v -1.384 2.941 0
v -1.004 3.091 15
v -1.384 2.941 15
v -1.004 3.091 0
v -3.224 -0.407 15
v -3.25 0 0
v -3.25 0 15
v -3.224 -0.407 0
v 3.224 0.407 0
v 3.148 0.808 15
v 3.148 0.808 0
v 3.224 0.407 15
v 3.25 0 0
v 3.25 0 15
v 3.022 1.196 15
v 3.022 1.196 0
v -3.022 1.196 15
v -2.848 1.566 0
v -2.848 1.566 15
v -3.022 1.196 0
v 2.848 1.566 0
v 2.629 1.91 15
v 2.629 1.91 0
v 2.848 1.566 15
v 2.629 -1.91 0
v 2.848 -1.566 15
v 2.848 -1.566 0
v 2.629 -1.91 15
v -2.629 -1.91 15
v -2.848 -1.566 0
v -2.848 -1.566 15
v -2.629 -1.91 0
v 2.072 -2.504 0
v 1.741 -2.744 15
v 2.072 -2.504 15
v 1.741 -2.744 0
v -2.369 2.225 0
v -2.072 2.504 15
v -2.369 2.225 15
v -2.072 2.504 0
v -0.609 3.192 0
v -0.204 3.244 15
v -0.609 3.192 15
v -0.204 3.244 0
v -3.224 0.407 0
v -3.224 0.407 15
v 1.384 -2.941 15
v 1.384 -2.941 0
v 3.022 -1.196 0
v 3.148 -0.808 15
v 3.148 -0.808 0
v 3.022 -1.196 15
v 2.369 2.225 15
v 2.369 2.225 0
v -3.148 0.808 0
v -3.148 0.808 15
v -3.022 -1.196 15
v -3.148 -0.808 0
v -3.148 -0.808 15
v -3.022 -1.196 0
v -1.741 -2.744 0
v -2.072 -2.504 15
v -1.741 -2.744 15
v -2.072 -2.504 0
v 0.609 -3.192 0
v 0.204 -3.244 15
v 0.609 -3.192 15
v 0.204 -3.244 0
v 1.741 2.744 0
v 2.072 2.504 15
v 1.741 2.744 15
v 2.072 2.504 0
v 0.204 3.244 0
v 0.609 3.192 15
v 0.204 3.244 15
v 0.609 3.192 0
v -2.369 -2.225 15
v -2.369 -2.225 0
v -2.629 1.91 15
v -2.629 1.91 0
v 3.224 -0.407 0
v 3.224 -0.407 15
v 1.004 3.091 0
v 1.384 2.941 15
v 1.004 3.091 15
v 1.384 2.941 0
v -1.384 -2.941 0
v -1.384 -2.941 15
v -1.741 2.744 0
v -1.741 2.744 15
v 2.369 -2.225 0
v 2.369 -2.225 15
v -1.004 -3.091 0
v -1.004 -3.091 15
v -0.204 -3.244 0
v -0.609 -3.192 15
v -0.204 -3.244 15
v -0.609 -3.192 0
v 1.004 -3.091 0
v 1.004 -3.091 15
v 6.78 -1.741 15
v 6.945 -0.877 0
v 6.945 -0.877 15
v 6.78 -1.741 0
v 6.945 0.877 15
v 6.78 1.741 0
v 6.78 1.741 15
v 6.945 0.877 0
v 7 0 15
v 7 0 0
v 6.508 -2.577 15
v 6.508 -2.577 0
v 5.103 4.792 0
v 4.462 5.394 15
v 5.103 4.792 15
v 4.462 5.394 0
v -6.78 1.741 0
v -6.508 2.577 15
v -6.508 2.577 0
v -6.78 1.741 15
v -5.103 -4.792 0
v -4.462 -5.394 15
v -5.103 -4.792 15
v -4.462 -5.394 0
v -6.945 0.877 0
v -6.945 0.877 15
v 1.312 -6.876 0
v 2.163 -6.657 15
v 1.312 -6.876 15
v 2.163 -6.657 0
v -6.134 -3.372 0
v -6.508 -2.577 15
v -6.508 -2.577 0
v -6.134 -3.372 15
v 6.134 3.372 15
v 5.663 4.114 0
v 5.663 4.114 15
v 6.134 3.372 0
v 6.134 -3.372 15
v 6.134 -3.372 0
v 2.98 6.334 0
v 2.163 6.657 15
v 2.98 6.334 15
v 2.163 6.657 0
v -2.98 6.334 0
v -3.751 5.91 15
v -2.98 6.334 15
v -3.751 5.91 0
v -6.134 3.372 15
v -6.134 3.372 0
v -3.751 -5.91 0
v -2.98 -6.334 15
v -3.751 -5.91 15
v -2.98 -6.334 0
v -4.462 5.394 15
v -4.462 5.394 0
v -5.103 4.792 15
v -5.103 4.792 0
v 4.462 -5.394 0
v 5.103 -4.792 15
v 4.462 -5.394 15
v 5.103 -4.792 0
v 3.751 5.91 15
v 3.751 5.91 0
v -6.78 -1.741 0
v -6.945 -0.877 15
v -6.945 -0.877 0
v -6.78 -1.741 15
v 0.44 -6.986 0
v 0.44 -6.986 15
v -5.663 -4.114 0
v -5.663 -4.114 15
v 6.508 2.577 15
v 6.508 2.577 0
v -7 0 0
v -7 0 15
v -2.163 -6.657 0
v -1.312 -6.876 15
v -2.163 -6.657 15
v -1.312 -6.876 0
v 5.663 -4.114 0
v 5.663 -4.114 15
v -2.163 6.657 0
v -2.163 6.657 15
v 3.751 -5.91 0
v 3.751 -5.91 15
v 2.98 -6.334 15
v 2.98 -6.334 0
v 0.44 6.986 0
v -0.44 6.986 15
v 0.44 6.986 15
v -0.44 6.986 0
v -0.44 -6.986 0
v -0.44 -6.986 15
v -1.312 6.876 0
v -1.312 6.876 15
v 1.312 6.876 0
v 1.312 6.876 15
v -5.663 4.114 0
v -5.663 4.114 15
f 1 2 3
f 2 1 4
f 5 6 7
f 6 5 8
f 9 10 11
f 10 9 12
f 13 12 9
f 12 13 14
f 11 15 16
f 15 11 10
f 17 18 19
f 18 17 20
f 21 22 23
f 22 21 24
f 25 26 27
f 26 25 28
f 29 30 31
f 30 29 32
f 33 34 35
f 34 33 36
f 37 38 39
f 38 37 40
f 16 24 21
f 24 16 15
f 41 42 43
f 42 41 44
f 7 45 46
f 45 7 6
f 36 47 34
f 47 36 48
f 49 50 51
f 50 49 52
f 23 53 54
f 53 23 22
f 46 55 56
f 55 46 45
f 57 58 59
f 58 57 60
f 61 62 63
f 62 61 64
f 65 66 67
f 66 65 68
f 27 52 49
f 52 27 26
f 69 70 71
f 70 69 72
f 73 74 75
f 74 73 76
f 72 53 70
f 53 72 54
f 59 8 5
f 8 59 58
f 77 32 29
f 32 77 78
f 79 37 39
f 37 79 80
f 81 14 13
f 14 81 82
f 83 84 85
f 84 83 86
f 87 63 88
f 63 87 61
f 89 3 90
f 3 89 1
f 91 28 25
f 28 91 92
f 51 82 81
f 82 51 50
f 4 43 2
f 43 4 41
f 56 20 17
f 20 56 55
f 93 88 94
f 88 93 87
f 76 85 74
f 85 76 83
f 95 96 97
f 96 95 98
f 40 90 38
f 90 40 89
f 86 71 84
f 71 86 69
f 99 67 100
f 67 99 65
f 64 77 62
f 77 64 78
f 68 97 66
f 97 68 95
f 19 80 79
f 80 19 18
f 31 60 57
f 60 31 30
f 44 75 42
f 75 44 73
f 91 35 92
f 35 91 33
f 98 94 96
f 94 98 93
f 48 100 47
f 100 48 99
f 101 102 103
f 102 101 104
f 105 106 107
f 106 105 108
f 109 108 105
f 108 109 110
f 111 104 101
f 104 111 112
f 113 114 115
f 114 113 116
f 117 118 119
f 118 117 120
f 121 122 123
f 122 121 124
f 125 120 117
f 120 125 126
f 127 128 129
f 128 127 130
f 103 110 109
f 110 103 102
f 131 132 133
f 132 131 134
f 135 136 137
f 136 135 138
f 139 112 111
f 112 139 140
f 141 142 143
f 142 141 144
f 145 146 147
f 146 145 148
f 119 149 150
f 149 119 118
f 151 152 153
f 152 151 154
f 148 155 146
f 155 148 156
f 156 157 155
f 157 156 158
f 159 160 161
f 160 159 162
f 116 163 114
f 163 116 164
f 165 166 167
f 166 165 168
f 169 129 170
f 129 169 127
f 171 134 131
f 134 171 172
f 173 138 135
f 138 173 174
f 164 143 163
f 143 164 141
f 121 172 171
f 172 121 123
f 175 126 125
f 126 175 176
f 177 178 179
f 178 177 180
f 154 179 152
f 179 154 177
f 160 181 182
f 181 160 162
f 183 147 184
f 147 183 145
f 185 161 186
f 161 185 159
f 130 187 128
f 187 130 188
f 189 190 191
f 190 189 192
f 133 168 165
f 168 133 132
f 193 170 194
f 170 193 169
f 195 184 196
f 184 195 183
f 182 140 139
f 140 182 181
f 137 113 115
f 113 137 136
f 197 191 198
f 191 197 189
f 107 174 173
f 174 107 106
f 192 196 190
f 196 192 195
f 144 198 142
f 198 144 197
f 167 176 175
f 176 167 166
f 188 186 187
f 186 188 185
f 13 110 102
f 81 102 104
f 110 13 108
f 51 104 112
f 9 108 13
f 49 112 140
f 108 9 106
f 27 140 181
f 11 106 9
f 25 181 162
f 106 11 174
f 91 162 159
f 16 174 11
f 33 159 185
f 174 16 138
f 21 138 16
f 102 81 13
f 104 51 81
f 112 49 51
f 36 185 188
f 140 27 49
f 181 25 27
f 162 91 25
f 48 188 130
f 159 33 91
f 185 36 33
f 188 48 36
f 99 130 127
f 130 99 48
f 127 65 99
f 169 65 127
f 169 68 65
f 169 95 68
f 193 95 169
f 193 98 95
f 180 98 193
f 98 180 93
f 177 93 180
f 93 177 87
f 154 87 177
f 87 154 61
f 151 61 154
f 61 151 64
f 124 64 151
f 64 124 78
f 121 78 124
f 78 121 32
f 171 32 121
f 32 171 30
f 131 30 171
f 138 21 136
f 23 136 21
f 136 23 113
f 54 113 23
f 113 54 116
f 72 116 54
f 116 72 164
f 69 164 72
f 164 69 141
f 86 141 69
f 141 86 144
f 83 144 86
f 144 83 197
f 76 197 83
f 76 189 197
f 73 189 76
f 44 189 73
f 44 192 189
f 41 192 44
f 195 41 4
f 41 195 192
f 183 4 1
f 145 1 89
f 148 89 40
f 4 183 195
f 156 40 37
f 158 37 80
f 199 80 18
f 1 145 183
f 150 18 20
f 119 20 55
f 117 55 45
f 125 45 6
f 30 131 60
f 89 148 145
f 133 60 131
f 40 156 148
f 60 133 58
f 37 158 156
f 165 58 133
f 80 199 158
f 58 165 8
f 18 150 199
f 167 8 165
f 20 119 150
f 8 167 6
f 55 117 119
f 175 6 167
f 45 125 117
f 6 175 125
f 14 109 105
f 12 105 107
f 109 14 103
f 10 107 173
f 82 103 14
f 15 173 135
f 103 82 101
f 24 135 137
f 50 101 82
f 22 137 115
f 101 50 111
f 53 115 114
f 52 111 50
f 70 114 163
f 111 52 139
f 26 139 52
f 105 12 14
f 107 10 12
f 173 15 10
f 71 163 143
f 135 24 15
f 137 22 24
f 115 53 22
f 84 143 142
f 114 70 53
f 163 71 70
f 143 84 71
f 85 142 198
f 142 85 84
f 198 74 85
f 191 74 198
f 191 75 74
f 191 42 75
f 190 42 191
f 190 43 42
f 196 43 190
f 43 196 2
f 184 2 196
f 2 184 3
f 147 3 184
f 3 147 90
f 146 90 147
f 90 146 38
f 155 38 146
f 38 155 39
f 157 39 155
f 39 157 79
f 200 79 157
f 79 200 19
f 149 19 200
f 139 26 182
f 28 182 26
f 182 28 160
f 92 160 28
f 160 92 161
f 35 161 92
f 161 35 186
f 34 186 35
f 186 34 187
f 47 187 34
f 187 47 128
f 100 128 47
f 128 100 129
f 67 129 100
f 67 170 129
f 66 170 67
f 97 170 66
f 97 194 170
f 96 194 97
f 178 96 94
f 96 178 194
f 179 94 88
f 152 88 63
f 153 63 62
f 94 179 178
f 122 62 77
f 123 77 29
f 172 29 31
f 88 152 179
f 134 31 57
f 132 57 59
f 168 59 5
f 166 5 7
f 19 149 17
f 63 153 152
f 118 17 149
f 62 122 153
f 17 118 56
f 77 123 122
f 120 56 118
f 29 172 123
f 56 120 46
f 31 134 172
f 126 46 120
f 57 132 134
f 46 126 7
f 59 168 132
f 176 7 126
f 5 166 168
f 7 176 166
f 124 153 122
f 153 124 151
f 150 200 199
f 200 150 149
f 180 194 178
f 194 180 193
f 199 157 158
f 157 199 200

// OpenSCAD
$fn = 50;

difference() {
	union() {
		cylinder(h = 15, r = 7.0);
	}
	union() {
		translate(v = [0, 0, -100]) {
			cylinder(h = 200, r = 3.25);
		}
		translate(v = [0, 0, -100]) {
			cylinder(h = 200, r = 1.8);
		}
	}
}
